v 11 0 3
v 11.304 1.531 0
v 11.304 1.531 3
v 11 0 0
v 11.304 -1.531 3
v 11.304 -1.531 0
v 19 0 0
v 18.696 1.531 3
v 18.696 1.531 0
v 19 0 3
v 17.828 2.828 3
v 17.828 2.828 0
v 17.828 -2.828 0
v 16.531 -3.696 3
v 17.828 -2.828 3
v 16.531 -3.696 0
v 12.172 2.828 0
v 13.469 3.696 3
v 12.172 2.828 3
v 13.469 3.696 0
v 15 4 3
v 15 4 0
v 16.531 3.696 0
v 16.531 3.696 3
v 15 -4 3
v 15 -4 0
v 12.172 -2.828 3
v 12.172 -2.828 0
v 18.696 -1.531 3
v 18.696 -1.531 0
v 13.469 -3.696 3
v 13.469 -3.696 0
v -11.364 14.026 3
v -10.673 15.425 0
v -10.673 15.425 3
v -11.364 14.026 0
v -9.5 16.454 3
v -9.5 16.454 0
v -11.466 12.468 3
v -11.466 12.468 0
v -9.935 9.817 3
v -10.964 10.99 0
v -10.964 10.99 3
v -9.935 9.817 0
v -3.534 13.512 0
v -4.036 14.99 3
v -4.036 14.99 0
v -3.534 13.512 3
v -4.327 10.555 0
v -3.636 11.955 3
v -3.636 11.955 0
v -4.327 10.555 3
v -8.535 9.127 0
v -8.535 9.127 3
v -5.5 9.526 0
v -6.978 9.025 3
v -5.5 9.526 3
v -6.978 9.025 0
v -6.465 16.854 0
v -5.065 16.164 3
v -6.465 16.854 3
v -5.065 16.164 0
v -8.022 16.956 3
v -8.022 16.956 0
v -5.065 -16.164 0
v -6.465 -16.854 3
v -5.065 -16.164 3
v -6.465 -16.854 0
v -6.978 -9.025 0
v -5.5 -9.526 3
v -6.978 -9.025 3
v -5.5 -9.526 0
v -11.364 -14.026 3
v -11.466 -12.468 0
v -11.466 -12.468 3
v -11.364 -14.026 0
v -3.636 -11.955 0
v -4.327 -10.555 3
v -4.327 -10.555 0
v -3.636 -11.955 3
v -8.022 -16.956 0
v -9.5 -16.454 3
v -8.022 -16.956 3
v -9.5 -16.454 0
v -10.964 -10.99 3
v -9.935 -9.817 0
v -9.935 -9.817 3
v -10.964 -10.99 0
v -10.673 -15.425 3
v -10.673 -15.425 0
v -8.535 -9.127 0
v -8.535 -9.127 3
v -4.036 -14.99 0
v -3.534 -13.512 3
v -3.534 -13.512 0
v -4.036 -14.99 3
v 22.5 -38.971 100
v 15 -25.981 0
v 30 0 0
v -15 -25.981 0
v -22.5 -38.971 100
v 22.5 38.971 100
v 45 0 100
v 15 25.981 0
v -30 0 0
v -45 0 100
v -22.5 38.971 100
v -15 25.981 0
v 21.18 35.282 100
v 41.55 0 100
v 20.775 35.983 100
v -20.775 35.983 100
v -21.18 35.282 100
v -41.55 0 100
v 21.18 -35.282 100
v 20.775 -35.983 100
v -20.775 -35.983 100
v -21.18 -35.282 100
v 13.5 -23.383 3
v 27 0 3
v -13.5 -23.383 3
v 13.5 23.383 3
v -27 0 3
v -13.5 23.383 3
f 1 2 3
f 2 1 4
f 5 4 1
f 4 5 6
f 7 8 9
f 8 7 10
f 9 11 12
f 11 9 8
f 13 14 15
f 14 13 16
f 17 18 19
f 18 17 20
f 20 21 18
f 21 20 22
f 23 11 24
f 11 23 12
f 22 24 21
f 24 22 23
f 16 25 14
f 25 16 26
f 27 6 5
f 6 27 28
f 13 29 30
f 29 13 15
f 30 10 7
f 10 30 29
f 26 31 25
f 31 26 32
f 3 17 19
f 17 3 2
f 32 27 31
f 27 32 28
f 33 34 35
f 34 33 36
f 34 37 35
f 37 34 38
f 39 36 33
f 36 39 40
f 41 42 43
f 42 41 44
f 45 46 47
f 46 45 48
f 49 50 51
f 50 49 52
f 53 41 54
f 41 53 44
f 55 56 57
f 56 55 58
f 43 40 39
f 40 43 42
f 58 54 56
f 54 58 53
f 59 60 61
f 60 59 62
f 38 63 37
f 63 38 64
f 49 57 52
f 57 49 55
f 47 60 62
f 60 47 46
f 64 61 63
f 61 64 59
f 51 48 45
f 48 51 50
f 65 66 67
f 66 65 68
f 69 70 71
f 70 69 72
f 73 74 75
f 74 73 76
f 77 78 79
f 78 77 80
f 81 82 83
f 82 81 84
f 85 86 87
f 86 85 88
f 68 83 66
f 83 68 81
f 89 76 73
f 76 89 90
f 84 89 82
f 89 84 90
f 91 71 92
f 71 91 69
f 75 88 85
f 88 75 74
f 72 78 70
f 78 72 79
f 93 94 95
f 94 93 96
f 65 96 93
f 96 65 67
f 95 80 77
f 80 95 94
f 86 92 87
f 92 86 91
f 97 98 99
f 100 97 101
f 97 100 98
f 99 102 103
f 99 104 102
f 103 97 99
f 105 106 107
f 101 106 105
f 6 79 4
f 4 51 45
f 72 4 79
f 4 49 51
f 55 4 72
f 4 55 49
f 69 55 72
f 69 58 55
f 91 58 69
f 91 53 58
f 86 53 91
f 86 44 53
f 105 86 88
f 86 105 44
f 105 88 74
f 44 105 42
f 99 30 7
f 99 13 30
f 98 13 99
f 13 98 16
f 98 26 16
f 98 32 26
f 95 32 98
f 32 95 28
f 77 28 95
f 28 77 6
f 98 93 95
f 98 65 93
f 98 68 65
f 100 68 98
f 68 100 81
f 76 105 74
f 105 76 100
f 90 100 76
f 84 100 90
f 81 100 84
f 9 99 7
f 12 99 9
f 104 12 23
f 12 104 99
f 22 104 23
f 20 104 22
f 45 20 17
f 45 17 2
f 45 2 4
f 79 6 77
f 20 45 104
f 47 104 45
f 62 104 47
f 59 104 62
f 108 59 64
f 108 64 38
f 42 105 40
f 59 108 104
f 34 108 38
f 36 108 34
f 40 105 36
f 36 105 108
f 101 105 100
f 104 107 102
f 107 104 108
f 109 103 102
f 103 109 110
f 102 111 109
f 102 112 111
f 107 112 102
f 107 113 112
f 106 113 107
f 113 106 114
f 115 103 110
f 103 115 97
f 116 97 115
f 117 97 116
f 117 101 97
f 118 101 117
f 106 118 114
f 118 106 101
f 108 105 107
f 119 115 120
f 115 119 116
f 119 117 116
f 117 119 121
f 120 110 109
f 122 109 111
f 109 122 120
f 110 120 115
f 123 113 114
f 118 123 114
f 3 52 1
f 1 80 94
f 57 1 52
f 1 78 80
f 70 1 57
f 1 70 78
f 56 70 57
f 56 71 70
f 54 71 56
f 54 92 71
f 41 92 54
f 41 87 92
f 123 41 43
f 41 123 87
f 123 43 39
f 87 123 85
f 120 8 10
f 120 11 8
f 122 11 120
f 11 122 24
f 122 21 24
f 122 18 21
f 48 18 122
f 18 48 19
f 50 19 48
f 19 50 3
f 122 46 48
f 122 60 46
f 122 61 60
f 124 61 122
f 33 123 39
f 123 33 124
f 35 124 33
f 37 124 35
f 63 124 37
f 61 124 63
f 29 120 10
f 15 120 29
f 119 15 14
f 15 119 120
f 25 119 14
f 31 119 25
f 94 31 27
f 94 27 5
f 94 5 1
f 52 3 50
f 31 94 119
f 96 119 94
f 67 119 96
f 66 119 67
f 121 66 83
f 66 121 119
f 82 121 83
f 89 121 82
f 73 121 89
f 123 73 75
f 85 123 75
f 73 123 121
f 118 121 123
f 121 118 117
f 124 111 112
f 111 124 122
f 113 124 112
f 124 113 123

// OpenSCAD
// Geometric Planter - Hexagonal Low Poly
// Trending on Etsy & MakerWorld — sells for $12-25
// Print: 0.2mm, 3 walls, 15% infill, no supports
// Use vase mode for thin walls (1 wall, 0 top layers)

VASE_MODE  = false;  // Set true to slice in vase mode

TOP_D    = 90;
BOT_D    = 60;
HEIGHT   = 100;
WALL_T   = 3;
DRAIN_D  = 8;
FACETS   = 6;       // 6 = hexagon, 8 = octagon, 5 = pentagon

module pot_outer() {
    cylinder(d1 = BOT_D, d2 = TOP_D, h = HEIGHT, $fn = FACETS);
}

module pot_inner() {
    translate([0, 0, WALL_T])
        cylinder(d1 = BOT_D - 2*WALL_T, d2 = TOP_D - 2*WALL_T,
                 h = HEIGHT, $fn = FACETS);
}

module drainage_holes() {
    count = 3;
    for (i = [0 : count - 1])
        rotate([0, 0, i * 360/count])
            translate([BOT_D/4, 0, -1])
                cylinder(d = DRAIN_D, h = WALL_T + 2, $fn = 16);
}

if (VASE_MODE) {
    pot_outer();
} else {
    difference() {
        pot_outer();
        pot_inner();
        drainage_holes();
    }
}
